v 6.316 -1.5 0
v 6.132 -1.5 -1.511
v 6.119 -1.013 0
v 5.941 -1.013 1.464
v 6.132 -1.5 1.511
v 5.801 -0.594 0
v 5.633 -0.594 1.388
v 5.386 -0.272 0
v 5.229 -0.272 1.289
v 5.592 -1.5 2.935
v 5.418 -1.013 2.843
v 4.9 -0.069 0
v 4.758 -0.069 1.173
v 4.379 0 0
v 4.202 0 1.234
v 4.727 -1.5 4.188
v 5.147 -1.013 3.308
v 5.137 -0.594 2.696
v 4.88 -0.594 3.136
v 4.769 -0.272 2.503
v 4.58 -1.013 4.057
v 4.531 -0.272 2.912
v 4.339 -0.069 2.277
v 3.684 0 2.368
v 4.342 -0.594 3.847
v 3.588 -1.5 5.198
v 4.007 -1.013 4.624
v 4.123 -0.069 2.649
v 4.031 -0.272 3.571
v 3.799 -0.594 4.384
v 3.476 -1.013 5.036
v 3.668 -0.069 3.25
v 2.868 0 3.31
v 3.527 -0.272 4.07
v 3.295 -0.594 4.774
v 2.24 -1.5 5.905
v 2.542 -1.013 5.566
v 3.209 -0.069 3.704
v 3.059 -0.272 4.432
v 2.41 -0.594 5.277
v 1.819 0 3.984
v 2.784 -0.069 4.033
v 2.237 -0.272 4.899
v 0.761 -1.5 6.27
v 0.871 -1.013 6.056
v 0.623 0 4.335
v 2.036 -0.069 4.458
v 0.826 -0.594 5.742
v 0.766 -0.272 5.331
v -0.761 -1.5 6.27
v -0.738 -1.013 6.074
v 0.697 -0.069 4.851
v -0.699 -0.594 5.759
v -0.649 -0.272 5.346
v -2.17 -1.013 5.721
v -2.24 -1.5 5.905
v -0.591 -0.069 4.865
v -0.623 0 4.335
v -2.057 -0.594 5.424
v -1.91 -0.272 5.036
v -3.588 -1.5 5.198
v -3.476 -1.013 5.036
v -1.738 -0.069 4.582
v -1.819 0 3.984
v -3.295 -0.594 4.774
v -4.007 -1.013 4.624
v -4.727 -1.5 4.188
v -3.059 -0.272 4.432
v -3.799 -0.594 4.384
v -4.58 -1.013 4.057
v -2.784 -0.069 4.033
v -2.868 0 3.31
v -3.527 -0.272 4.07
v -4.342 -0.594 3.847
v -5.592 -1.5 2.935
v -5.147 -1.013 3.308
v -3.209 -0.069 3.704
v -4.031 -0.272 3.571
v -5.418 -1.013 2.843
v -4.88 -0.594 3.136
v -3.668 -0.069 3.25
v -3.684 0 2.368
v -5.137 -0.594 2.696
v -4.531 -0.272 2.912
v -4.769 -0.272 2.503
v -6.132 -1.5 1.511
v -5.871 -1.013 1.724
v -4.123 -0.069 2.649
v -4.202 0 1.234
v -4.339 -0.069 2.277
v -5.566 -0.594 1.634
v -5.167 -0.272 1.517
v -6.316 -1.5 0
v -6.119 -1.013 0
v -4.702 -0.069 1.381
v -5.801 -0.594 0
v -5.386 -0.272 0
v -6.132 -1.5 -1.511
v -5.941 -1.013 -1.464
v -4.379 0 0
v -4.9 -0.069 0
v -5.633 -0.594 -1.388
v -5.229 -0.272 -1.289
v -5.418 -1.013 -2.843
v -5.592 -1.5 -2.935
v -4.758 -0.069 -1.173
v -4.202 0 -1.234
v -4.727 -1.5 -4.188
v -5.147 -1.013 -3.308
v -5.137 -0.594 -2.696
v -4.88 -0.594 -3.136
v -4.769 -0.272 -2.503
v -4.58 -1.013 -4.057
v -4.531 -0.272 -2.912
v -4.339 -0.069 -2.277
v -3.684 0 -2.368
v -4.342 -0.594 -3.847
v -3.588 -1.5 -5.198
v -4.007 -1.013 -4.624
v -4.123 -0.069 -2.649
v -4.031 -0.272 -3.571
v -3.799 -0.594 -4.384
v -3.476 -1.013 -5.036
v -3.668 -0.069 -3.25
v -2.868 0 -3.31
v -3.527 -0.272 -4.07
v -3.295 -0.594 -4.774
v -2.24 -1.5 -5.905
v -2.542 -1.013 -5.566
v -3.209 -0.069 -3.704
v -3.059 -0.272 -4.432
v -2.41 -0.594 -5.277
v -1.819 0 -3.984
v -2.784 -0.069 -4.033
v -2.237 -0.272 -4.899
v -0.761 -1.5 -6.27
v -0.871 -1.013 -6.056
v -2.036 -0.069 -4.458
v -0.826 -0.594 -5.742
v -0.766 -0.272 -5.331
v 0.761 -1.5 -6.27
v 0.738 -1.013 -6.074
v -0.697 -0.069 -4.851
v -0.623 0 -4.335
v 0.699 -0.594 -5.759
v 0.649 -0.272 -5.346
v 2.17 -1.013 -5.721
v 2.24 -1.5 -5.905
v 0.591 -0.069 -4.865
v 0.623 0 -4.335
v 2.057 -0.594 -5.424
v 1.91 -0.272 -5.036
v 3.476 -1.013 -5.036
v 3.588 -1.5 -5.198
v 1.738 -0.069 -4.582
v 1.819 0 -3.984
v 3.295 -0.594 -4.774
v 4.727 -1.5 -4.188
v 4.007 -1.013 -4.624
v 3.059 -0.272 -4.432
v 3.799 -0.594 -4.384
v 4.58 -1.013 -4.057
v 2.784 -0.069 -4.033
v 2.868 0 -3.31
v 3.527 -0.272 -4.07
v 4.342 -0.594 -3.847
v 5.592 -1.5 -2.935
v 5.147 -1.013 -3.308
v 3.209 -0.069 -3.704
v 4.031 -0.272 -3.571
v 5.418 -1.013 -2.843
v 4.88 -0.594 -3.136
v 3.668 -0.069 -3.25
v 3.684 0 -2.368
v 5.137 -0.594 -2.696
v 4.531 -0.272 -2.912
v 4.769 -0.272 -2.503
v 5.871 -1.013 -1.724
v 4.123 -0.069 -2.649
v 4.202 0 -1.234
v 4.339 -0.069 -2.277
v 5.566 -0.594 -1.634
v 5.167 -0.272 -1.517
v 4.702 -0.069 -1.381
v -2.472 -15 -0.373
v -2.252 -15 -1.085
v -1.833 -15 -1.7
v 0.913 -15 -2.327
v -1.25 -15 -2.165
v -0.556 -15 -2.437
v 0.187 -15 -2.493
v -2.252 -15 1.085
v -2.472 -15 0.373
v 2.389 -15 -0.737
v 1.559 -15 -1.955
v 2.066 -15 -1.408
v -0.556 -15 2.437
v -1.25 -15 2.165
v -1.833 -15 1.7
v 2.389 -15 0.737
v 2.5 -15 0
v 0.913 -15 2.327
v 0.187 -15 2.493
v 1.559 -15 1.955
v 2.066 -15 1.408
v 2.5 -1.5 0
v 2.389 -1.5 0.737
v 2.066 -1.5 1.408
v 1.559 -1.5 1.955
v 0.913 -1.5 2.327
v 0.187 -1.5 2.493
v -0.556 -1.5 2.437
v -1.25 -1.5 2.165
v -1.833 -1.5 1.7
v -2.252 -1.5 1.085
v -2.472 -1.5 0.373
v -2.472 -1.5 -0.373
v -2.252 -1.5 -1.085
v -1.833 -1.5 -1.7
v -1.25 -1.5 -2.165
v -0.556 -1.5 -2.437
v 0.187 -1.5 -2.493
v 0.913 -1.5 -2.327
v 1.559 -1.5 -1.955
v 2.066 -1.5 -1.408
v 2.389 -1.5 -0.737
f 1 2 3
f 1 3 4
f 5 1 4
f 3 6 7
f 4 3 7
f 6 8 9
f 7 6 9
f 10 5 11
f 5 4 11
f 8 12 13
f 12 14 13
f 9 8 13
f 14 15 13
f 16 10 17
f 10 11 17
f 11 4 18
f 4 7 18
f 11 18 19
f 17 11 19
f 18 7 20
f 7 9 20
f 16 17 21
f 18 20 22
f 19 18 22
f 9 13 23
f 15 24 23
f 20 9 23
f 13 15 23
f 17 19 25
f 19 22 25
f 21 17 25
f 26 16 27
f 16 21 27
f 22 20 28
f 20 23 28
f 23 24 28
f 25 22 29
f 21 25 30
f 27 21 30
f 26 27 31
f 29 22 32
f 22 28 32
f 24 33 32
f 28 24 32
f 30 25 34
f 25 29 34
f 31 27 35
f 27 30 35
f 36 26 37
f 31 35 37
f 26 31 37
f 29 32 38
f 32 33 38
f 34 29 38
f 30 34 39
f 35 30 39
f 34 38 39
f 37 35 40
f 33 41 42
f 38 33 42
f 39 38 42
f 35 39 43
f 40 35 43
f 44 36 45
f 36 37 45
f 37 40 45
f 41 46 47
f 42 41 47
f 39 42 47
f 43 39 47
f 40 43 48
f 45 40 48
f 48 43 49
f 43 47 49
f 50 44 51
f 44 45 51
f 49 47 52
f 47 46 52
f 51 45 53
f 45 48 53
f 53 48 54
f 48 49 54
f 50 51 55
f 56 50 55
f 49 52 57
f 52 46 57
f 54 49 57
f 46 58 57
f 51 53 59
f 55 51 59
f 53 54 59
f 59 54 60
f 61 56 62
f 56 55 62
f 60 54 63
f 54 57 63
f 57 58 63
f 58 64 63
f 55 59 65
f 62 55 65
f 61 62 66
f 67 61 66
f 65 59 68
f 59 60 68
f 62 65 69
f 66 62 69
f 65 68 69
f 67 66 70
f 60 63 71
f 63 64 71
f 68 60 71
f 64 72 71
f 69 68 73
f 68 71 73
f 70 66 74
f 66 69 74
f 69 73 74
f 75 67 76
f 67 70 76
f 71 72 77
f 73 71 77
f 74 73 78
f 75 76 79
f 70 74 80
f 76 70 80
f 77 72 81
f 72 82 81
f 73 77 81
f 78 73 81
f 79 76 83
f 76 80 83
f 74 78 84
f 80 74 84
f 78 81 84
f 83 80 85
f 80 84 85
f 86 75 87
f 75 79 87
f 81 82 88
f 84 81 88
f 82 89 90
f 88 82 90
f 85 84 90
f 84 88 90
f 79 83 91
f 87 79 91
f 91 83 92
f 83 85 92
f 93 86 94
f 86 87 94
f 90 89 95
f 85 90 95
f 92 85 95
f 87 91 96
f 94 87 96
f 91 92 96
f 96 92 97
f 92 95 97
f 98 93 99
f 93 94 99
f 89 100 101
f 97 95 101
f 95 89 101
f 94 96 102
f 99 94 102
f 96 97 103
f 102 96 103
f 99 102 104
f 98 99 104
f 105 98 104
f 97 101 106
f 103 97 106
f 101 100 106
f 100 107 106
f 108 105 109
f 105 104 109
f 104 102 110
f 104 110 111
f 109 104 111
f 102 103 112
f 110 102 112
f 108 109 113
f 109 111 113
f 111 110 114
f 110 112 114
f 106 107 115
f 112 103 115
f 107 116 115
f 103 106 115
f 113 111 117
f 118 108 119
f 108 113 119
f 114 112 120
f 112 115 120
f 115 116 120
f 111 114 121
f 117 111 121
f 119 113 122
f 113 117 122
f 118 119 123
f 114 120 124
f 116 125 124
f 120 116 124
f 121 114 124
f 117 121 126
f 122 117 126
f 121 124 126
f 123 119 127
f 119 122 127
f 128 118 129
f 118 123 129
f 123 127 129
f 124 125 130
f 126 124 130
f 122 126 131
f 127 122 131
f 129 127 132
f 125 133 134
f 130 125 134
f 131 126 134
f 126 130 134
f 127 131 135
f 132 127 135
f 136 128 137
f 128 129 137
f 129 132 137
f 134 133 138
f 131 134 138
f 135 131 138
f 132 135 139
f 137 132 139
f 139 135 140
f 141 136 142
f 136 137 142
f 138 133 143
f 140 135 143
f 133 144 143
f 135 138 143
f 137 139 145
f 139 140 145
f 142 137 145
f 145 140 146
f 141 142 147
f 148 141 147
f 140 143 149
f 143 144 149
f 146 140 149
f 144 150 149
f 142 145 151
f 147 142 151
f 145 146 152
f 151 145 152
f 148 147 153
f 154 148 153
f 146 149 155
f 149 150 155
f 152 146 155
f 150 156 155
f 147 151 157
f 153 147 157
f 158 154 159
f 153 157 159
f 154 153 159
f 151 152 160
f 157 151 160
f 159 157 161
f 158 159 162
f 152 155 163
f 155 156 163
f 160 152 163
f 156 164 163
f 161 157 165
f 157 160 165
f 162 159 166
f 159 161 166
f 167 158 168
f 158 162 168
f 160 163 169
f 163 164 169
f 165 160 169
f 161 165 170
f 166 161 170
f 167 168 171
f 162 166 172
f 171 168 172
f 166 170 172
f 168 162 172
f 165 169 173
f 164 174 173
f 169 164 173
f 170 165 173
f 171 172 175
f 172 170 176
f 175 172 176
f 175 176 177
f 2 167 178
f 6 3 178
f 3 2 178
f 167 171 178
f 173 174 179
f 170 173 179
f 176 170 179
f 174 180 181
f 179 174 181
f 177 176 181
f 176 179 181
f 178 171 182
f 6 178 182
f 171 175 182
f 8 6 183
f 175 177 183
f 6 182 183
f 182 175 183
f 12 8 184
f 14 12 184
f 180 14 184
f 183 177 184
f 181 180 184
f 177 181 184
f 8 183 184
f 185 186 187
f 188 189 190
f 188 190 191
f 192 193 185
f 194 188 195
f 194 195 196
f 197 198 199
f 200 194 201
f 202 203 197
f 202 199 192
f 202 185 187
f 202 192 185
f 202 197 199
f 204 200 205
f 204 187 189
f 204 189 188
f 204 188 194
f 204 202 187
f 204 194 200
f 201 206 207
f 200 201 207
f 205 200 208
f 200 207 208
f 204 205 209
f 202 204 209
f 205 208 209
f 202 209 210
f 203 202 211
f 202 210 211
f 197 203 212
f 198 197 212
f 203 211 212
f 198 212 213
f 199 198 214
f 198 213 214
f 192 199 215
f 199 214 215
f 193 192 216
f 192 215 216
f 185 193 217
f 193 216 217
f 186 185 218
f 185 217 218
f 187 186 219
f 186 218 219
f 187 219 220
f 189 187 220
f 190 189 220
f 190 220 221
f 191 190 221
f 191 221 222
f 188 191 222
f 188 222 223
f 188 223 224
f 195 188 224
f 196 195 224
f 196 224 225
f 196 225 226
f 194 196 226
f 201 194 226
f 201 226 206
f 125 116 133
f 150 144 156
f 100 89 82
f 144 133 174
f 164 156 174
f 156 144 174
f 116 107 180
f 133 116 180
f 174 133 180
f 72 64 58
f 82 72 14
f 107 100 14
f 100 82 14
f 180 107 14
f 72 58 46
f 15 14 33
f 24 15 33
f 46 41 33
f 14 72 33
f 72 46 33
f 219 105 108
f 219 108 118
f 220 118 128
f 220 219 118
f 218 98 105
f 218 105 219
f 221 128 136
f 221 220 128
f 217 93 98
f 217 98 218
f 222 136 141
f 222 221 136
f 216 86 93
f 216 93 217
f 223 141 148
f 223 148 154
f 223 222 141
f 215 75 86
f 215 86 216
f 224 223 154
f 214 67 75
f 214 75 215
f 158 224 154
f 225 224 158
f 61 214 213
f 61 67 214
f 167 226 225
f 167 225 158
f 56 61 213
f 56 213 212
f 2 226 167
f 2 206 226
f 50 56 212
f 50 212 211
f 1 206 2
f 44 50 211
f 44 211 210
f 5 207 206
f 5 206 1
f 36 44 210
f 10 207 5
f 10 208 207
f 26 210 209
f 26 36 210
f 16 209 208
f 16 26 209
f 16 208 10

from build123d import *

# Parameters (mm, degrees)
F0_R     = 2.5
F1_DEPTH = 15
F0_R_2   = 6.3158003242
F2_DEPTH = 1.5


# Not quite as in the source:
# - a fillet or chamfer that OpenCascade refuses, or shapes differently, is made with other operations: its cross-section is extruded or revolved along the edge and cut away or added


with BuildPart() as f1:
    # F0 (on Front) → F1 (new body)
    with BuildSketch(Plane.XZ):
        Circle(F0_R)
    extrude(amount=F1_DEPTH)

    # F0 (on Front) → F2 (join)
    with BuildSketch(Plane.XZ):
        Circle(F0_R_2)
        Circle(F0_R, mode=Mode.SUBTRACT)
    extrude(amount=F2_DEPTH)

    # F3: fillet of radius 2 on 1 edges, made by hand

    # F3_s1 → F3_t2 (revolve, cut)
    with BuildSketch(Plane.XY):
        with BuildLine():
            ThreePointArc((6.3158003242, -1.5), (5.6040535225, -0.4188611699), (4.3793086511, 0))
            Line((4.3793086511, 0), (6.3158003242, 0))
            Line((6.3158003242, 0), (6.3158003242, -1.5))
        make_face()
    revolve(axis=Axis((0, 0, 0), (0, -1, 0)), mode=Mode.SUBTRACT)


solid = f1.part
